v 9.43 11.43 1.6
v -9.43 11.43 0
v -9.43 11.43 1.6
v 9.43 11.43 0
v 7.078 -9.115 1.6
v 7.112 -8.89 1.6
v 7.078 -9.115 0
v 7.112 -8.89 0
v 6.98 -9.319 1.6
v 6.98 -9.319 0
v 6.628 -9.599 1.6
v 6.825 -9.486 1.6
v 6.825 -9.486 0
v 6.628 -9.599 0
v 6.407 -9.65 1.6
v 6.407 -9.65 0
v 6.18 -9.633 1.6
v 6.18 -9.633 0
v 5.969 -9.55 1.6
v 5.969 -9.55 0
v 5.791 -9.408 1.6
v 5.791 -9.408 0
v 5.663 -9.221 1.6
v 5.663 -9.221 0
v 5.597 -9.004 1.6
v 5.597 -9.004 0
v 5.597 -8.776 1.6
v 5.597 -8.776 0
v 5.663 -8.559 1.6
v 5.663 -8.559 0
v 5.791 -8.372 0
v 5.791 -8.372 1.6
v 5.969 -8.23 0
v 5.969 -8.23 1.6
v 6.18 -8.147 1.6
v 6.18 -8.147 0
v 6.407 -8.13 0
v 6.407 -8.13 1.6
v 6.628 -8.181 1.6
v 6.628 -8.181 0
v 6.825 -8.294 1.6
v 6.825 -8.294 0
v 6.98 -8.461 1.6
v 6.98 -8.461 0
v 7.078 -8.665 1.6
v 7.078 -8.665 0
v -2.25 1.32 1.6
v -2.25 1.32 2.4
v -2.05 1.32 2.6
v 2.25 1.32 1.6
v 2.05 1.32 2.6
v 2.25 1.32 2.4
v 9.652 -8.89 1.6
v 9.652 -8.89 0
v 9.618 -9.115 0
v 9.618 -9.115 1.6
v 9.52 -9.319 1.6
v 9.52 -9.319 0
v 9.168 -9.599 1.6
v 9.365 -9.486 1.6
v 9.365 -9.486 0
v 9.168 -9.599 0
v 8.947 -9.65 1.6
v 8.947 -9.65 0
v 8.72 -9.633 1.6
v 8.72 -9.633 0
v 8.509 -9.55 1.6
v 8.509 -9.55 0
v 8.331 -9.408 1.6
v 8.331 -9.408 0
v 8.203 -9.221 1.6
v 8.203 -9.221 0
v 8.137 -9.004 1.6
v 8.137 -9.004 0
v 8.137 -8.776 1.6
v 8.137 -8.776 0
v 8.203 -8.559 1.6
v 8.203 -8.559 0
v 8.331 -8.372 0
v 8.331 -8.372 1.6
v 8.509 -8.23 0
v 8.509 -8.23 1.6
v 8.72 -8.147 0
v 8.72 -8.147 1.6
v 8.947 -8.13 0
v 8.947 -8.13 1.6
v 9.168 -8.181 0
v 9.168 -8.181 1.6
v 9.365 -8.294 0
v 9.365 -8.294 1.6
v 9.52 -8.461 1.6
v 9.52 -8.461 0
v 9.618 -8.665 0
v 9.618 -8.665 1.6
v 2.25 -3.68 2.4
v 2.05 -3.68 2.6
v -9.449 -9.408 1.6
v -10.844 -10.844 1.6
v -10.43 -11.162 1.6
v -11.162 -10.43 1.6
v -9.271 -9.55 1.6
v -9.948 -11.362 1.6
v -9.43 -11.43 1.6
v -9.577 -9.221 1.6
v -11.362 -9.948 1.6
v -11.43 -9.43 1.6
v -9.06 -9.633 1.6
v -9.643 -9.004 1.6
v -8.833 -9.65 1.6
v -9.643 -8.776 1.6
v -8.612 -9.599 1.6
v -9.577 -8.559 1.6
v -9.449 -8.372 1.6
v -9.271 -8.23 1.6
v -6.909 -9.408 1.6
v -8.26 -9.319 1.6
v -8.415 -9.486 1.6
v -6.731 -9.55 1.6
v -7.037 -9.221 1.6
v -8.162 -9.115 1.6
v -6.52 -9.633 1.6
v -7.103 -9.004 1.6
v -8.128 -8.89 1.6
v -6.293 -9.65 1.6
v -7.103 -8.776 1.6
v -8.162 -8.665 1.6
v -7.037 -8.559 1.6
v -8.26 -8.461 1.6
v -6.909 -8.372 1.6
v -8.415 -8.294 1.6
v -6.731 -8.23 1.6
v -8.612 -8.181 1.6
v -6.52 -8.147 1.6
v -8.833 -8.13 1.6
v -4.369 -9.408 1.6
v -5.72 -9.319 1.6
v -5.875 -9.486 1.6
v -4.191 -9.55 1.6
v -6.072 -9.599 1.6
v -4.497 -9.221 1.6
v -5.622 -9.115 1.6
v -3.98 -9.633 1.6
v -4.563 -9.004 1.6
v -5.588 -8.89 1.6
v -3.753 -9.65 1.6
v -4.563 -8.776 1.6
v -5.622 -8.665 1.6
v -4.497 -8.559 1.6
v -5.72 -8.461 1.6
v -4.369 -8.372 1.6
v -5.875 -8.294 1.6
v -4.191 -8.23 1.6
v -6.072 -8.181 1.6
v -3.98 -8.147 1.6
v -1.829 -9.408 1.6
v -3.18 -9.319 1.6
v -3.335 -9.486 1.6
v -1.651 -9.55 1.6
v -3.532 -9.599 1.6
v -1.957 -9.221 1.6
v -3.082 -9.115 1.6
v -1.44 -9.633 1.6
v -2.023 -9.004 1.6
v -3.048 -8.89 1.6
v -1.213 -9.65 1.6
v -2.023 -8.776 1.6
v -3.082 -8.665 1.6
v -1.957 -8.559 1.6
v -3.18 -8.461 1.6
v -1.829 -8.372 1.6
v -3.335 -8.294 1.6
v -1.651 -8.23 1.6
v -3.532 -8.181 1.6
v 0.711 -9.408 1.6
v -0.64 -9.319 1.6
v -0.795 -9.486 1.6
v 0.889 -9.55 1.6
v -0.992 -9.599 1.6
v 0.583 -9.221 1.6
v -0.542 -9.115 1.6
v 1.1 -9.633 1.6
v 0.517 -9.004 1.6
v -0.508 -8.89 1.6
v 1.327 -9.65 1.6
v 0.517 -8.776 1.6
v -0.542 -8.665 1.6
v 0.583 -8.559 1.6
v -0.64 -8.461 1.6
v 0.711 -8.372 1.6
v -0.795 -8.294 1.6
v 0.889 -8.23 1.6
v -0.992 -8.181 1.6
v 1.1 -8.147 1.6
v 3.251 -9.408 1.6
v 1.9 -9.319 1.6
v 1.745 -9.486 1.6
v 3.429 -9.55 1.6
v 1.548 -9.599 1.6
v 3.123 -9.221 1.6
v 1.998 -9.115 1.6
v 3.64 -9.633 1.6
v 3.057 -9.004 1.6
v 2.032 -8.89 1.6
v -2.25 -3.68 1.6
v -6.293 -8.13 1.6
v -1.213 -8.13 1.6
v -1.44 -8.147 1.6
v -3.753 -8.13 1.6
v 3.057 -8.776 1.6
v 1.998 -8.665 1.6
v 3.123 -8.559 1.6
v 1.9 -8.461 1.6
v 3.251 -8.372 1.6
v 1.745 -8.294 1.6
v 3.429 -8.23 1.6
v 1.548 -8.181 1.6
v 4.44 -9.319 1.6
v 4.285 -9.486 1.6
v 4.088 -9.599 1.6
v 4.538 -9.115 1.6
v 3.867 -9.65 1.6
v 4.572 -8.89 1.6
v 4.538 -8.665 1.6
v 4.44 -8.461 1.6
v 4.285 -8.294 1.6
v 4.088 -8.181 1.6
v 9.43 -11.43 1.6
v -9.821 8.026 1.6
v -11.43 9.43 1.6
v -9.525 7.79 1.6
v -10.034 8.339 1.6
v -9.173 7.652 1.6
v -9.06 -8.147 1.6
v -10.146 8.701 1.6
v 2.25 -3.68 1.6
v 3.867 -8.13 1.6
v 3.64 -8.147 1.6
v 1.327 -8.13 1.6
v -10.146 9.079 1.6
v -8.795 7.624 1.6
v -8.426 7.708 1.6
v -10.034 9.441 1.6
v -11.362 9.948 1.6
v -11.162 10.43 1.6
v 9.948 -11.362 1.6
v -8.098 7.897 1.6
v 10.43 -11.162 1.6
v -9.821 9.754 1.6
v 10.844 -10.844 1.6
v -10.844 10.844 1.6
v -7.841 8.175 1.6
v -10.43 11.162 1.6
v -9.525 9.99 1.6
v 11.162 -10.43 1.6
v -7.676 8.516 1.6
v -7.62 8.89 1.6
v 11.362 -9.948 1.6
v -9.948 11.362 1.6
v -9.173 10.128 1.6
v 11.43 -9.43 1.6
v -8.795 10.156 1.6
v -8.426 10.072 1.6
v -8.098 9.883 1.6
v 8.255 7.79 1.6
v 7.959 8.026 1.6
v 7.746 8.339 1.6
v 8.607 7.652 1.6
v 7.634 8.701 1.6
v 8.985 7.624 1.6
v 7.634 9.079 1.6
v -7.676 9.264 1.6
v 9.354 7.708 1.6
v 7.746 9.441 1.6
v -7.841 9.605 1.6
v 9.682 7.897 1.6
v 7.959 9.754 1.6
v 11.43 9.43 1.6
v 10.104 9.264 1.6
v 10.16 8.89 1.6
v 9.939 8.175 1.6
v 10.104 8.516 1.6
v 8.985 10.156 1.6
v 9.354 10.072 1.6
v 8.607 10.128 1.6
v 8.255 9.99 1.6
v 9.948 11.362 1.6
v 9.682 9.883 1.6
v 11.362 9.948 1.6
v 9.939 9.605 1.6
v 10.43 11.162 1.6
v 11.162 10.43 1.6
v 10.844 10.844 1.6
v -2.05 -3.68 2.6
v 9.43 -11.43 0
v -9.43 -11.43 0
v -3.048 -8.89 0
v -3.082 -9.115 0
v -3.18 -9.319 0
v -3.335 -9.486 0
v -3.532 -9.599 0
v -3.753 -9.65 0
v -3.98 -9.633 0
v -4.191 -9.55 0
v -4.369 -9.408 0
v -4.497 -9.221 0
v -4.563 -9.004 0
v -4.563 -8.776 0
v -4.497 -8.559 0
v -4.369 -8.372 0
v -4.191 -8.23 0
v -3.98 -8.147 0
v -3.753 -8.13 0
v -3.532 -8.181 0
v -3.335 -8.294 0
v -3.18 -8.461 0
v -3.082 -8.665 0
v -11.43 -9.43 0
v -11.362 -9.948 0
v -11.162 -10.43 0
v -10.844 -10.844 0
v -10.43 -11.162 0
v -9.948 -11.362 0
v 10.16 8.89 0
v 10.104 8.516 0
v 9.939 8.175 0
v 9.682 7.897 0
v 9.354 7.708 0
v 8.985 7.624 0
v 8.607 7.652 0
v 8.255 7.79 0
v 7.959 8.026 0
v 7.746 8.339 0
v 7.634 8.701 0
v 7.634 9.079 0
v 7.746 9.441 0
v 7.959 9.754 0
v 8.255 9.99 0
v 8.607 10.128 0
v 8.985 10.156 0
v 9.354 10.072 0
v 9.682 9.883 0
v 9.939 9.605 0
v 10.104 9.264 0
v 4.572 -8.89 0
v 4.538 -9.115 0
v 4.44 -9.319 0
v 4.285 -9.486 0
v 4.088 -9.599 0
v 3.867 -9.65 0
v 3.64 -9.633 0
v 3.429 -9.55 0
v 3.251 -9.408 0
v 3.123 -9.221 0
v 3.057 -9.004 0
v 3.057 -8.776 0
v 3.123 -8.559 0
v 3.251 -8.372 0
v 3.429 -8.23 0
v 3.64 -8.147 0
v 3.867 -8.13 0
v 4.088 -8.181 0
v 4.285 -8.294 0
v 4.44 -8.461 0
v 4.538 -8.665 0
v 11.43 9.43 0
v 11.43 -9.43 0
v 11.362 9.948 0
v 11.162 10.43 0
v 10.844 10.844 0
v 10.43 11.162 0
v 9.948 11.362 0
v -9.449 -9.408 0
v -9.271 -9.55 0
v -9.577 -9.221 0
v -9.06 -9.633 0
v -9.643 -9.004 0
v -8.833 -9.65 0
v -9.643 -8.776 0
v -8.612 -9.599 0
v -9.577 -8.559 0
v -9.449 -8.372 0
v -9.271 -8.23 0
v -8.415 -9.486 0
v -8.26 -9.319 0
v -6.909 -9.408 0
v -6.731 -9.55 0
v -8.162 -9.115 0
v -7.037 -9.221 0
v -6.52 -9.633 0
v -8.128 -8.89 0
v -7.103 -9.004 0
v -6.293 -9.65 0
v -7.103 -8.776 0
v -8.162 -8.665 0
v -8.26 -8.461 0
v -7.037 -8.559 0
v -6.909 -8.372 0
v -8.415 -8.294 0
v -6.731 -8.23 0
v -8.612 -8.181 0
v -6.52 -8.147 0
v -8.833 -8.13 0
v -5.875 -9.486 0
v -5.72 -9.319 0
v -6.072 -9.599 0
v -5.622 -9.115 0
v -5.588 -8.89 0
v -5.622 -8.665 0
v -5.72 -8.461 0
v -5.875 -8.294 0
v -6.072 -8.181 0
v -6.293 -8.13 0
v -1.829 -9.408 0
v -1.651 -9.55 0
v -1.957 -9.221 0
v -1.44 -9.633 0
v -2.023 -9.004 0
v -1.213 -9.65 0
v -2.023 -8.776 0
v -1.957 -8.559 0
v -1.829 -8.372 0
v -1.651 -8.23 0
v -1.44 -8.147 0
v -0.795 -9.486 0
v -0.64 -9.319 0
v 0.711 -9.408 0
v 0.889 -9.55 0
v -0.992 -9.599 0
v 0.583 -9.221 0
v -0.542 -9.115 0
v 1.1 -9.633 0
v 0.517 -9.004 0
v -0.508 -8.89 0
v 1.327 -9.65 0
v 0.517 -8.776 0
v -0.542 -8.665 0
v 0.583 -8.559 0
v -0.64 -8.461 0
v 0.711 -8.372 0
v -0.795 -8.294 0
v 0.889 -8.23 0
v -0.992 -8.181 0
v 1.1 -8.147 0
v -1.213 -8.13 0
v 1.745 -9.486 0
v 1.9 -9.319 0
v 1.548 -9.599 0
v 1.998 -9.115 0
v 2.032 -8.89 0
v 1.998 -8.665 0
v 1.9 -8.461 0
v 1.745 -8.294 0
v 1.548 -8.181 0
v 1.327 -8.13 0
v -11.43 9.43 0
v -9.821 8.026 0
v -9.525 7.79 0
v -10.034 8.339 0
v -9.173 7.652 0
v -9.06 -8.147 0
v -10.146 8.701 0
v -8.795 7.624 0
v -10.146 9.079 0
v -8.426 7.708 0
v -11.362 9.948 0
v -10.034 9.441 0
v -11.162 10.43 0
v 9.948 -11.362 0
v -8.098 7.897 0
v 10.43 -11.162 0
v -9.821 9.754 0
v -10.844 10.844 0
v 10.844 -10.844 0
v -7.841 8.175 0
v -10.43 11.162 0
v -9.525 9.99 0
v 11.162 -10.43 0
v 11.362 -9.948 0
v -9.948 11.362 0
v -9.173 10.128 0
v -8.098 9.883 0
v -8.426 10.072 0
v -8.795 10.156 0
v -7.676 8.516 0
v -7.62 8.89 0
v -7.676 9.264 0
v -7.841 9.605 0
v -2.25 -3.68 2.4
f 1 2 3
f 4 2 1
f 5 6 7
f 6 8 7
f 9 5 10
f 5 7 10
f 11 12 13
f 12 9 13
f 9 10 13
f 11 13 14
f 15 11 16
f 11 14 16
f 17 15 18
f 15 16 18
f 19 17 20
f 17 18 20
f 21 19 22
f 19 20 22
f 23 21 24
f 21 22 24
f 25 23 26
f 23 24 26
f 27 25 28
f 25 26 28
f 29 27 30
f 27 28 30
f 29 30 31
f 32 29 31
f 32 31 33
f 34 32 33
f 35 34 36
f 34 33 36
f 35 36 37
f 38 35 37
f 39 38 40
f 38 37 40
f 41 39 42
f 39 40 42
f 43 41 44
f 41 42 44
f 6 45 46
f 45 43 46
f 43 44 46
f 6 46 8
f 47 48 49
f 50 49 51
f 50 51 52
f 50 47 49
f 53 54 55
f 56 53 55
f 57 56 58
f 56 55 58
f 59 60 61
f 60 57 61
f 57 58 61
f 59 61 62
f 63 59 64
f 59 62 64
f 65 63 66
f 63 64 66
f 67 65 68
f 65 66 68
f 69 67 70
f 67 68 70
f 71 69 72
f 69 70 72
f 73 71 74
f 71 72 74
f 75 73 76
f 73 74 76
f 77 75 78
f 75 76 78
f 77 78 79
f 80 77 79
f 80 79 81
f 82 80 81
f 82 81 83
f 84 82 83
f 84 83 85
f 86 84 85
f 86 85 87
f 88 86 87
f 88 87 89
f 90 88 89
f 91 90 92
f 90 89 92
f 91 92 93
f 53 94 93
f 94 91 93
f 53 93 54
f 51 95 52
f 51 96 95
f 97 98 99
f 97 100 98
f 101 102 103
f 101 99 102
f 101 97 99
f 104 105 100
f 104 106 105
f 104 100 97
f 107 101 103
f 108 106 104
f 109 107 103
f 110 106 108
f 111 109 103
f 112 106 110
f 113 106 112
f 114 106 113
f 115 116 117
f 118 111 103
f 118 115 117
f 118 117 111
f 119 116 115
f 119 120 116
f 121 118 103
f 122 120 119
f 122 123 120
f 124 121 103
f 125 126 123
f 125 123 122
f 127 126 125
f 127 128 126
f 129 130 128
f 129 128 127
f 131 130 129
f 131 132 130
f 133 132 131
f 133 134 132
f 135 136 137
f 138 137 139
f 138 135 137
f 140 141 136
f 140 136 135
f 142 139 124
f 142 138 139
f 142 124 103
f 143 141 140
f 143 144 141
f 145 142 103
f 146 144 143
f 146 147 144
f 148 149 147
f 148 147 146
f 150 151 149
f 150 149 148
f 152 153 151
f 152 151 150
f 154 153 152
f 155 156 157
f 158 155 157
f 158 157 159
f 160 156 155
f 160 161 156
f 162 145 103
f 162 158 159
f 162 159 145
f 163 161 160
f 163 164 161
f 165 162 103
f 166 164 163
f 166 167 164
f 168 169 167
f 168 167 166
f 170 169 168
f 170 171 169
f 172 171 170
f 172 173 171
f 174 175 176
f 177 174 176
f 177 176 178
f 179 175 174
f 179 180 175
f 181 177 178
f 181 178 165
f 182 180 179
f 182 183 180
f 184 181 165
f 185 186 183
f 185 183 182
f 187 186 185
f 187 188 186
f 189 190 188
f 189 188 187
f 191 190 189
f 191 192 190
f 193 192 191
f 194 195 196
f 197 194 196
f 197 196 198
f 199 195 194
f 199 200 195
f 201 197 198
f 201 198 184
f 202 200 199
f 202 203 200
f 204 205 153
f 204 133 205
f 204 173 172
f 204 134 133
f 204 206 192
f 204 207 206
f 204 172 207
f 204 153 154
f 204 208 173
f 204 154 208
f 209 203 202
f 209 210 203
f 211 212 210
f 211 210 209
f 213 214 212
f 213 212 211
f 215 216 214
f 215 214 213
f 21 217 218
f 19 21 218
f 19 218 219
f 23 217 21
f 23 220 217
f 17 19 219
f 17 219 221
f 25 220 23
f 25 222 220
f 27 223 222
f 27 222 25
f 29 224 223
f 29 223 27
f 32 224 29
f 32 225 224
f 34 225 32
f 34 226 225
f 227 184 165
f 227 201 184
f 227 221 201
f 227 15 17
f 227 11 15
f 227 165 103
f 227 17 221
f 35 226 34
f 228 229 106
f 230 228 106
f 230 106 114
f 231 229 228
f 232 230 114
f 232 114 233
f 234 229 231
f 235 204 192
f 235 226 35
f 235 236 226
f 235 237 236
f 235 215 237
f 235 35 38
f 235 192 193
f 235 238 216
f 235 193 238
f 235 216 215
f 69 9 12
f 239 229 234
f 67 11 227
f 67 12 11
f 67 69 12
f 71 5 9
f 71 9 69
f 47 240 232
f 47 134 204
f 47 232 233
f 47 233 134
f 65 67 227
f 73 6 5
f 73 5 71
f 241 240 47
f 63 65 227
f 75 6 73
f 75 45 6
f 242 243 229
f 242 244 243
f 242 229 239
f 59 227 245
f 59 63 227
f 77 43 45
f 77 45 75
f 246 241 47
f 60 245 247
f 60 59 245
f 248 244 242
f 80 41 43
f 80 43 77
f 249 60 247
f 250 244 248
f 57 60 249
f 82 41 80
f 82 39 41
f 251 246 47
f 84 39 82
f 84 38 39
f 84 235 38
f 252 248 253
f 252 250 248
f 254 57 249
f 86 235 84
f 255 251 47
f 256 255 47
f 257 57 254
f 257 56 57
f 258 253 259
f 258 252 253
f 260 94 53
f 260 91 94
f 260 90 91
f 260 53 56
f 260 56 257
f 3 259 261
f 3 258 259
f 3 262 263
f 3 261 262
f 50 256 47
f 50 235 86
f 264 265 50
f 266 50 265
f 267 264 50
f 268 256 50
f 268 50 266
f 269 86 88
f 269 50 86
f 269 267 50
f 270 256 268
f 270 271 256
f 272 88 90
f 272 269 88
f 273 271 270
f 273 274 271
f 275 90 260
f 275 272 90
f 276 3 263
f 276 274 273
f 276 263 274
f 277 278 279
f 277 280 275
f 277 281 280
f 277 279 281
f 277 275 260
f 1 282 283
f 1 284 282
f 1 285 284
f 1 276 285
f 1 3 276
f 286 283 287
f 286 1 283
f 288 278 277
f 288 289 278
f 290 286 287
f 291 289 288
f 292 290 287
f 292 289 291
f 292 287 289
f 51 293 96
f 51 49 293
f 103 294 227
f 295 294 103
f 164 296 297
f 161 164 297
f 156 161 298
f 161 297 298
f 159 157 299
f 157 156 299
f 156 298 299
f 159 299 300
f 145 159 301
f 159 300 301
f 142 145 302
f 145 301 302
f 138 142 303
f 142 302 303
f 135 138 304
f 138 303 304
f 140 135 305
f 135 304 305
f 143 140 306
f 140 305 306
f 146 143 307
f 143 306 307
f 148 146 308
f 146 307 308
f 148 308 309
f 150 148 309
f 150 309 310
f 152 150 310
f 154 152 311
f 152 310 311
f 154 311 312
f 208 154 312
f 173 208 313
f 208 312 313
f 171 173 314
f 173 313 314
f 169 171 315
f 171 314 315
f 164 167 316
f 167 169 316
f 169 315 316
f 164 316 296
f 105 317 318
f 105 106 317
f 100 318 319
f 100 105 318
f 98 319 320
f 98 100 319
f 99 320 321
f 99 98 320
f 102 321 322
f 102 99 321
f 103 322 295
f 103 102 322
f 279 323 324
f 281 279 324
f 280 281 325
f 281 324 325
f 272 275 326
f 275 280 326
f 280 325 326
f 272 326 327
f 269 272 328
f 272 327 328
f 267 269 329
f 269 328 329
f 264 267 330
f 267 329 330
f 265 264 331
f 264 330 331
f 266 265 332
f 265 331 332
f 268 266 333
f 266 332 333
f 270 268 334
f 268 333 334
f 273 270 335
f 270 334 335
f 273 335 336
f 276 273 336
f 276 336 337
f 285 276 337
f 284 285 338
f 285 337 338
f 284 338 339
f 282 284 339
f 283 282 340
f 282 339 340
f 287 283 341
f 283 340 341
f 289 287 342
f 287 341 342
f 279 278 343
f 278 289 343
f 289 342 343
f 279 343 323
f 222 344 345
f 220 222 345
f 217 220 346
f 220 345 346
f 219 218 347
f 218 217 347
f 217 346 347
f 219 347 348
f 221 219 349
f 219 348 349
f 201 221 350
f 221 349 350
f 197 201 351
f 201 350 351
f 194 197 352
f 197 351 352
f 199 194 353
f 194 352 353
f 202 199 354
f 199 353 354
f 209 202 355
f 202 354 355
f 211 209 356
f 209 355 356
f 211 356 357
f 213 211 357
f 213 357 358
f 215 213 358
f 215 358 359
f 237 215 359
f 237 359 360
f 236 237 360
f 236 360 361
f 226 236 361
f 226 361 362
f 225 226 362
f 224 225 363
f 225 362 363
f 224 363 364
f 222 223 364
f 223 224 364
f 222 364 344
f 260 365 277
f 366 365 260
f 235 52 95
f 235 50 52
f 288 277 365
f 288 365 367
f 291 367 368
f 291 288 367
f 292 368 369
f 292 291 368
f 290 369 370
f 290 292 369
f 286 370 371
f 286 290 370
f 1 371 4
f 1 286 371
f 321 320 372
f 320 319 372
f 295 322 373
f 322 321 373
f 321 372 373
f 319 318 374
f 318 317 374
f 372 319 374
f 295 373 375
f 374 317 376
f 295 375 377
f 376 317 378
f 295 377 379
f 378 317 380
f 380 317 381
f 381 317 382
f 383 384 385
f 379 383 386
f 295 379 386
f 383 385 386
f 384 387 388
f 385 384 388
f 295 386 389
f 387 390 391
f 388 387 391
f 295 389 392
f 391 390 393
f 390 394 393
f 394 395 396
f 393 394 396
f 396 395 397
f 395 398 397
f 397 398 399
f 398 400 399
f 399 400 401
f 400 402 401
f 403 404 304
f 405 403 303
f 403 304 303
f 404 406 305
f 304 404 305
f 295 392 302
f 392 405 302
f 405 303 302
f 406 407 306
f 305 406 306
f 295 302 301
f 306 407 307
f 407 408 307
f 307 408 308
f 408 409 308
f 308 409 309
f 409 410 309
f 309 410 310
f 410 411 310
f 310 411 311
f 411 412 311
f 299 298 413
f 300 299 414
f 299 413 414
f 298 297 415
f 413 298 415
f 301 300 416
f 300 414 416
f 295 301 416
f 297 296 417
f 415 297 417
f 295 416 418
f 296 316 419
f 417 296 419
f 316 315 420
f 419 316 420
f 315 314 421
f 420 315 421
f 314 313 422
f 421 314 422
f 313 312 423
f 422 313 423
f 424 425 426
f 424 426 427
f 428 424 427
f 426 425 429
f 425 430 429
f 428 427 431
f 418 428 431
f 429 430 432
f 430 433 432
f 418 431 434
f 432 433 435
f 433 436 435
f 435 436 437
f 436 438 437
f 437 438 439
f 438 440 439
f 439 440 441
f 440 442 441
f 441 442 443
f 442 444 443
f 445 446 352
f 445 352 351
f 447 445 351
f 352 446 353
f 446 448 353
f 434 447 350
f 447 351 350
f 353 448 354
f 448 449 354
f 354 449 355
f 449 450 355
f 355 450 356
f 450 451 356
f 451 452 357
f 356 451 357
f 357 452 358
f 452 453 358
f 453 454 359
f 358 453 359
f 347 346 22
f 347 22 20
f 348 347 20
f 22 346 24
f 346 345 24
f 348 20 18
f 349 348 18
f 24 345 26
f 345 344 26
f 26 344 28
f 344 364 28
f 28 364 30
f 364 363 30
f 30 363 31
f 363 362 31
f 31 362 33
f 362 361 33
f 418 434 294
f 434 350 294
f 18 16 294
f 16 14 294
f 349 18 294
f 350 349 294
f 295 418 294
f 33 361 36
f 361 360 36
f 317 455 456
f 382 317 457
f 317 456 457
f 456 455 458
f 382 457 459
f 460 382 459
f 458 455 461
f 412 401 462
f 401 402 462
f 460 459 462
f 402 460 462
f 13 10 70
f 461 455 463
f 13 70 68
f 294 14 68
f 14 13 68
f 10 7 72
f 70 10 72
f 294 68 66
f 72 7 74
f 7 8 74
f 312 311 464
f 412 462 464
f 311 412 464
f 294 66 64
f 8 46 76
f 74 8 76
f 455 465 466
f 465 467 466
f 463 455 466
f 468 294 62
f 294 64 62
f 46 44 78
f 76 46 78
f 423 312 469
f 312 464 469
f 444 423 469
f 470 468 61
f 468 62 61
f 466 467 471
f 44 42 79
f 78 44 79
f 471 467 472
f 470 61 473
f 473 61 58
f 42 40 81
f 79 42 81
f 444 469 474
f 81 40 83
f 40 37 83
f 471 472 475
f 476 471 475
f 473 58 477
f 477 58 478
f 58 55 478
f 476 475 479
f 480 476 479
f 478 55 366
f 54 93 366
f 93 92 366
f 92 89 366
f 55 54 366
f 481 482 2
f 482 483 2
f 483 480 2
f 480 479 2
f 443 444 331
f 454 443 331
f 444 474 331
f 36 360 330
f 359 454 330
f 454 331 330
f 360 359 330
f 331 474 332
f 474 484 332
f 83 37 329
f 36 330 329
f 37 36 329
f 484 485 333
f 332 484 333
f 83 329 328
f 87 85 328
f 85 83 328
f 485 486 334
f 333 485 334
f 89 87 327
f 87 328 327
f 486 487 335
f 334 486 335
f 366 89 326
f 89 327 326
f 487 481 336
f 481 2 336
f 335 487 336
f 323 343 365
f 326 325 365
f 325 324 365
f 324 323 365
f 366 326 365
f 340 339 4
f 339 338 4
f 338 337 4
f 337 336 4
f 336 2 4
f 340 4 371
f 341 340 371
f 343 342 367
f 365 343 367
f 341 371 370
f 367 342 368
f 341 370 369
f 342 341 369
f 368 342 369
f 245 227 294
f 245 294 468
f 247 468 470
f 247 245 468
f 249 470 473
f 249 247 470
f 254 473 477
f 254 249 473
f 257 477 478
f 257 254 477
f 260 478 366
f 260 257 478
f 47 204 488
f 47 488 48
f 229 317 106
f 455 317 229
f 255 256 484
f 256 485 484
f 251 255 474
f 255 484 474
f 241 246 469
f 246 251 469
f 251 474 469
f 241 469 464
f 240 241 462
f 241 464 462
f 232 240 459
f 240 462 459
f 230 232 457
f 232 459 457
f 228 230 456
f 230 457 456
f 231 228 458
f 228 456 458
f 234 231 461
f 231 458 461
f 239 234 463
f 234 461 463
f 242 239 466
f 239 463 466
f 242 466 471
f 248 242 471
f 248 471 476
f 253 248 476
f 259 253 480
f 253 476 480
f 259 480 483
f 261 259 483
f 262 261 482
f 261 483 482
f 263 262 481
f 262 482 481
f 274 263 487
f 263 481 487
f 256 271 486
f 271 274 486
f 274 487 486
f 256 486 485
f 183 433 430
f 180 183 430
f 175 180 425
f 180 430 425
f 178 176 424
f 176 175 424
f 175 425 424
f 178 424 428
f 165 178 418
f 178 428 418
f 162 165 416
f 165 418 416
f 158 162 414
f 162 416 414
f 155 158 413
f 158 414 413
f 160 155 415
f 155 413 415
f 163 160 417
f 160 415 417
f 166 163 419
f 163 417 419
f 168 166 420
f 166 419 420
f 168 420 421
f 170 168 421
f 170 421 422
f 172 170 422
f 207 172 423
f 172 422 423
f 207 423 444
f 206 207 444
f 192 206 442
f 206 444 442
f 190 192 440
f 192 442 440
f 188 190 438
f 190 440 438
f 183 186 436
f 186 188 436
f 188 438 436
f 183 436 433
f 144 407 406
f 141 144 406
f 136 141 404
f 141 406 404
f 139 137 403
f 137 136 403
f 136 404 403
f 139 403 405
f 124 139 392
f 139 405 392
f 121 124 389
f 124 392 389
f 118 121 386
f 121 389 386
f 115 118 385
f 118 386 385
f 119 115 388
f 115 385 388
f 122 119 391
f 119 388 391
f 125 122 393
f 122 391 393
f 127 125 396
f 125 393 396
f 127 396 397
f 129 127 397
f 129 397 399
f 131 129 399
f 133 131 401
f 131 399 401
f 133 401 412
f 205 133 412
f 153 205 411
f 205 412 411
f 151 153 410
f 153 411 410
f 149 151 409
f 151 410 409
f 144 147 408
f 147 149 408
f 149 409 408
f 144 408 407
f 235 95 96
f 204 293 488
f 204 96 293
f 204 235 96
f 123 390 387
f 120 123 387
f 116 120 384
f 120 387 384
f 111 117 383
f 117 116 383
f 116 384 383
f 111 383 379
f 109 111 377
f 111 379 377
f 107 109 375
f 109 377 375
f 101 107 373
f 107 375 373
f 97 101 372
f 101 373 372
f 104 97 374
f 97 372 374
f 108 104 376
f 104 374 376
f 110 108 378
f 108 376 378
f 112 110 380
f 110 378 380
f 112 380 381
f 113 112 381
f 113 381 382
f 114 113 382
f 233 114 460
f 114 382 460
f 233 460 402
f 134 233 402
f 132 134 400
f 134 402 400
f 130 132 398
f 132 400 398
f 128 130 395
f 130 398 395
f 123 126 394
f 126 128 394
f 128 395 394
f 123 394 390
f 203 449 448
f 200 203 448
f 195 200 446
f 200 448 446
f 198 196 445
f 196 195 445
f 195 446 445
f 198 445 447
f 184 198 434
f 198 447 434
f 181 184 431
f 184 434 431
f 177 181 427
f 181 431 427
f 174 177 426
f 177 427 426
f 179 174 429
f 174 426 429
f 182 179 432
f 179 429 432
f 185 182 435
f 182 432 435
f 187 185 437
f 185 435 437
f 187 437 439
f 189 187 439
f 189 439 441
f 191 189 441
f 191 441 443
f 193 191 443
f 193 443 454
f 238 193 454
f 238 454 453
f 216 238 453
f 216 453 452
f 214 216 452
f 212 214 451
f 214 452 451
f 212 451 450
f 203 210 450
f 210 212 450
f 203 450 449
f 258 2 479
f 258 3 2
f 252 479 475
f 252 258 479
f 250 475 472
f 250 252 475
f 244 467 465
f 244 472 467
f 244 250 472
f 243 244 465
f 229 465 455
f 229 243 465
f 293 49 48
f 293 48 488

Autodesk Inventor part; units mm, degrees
ref_plane "YZ Plane" through (0, 0, 0) normal (1, 0, 0) x (0, 1, 0)
ref_plane "XZ Plane" through (0, 0, 0) normal (0, 1, 0) x (-1, 0, 0)
ref_plane "XY Plane" through (0, 0, 0) normal (0, 0, 1) x (1, 0, 0)
sketch "Sketch1" plane through (0, 0, 0) normal (0, 0, 1) x (1, 0, 0)
  line L0 (11.43, -11.43) -> (-11.43, -11.43)
  line L1 (-11.43, -11.43) -> (-11.43, 11.43)
  line L2 (-11.43, 11.43) -> (11.43, 11.43)
  line L3 (11.43, 11.43) -> (11.43, -11.43)
  line L4 (11.43, -11.43) -> (-11.43, 11.43) construction
  line L5 (-11.43, -11.43) -> (11.43, 11.43) construction
  circle A0 centre (-8.89, 8.89) radius 1.27
  circle A1 centre (8.89, 8.89) radius 1.27
  line L6 (0, 11.43) -> (0, -11.43) construction
  circle A2 centre (-8.89, -8.89) radius 0.762
  circle A3 centre (-6.35, -8.89) radius 0.762
  circle A4 centre (-3.81, -8.89) radius 0.762
  circle A5 centre (-1.27, -8.89) radius 0.762
  circle A6 centre (1.27, -8.89) radius 0.762
  circle A7 centre (3.81, -8.89) radius 0.762
  circle A8 centre (6.35, -8.89) radius 0.762
  circle A9 centre (8.89, -8.89) radius 0.762
  point P0 (0, 0)
  dimension "d0" = 22.86
  dimension "d1" = 22.86
  dimension "d2" = 2.54
  dimension "d3" = 17.78
  dimension "d4" = 20.32
  dimension "d5" = 1.524
  dimension "d6" = 2.54
  dimension "d9" = 2.54
extrude "Extrusion1" add sketch "Sketch1" along normal blind 1.6
fillet "Fillet1" radius 2 4 edges at (-11.43, 11.43, 0.8) (11.43, 11.43, 0.8) (11.43, -11.43, 0.8) (-11.43, -11.43, 0.8)
sketch "Sketch2" plane through (0, 0, 1.6) normal (0, 0, 1) x (1, 0, 0)
  line L0 (2.25, -3.68) -> (-2.25, -3.68)
  line L1 (-2.25, -3.68) -> (-2.25, 1.32)
  line L2 (-2.25, 1.32) -> (2.25, 1.32)
  line L3 (2.25, 1.32) -> (2.25, -3.68)
  line L4 (2.25, -3.68) -> (-2.25, 1.32) construction
  line L5 (-2.25, -3.68) -> (2.25, 1.32) construction
  line L6 (9.43, 11.43) -> (-9.43, 11.43) projected
  line L7 (-9.43, -11.43) -> (9.43, -11.43) projected
  point P0 (0, 0)
  point P1 (0, -1.18)
  point P2 (0, -1.18)
  dimension "d17" = 4.5
  dimension "d18" = 5
  dimension "d20" = 12.75
extrude "Extrusion2" add sketch "Sketch2" along normal blind 1
chamfer "Chamfer1" distance 0.2 angle 45 2 edges at (-2.25, -1.18, 2.6) (2.25, -1.18, 2.6)
sketch "Sketch5" plane through (0, 0, 1.6) normal (0, 0, 1) x (1, 0, 0)
  line L0 (-11.3283, 11.4877) -> (11.6389, 11.4877) construction
  line L1 (11.6389, 11.4877) -> (11.6389, -11.3452) construction
  line L2 (11.6389, -11.3452) -> (-11.3283, -11.3452) construction
  line L3 (-11.3283, -11.3452) -> (-11.3283, 11.4877) construction
  point P0 (0, 0)
properties part number "Adafruit_INA260"
